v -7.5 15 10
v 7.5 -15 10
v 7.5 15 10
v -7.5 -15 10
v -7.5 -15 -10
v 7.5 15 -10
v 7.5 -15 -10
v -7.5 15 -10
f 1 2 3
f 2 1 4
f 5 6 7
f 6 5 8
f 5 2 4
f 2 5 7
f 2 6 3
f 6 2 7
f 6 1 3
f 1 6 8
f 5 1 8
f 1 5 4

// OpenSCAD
// Generated by generate_scads.py
cube(size=[15,30,20], center=true);
